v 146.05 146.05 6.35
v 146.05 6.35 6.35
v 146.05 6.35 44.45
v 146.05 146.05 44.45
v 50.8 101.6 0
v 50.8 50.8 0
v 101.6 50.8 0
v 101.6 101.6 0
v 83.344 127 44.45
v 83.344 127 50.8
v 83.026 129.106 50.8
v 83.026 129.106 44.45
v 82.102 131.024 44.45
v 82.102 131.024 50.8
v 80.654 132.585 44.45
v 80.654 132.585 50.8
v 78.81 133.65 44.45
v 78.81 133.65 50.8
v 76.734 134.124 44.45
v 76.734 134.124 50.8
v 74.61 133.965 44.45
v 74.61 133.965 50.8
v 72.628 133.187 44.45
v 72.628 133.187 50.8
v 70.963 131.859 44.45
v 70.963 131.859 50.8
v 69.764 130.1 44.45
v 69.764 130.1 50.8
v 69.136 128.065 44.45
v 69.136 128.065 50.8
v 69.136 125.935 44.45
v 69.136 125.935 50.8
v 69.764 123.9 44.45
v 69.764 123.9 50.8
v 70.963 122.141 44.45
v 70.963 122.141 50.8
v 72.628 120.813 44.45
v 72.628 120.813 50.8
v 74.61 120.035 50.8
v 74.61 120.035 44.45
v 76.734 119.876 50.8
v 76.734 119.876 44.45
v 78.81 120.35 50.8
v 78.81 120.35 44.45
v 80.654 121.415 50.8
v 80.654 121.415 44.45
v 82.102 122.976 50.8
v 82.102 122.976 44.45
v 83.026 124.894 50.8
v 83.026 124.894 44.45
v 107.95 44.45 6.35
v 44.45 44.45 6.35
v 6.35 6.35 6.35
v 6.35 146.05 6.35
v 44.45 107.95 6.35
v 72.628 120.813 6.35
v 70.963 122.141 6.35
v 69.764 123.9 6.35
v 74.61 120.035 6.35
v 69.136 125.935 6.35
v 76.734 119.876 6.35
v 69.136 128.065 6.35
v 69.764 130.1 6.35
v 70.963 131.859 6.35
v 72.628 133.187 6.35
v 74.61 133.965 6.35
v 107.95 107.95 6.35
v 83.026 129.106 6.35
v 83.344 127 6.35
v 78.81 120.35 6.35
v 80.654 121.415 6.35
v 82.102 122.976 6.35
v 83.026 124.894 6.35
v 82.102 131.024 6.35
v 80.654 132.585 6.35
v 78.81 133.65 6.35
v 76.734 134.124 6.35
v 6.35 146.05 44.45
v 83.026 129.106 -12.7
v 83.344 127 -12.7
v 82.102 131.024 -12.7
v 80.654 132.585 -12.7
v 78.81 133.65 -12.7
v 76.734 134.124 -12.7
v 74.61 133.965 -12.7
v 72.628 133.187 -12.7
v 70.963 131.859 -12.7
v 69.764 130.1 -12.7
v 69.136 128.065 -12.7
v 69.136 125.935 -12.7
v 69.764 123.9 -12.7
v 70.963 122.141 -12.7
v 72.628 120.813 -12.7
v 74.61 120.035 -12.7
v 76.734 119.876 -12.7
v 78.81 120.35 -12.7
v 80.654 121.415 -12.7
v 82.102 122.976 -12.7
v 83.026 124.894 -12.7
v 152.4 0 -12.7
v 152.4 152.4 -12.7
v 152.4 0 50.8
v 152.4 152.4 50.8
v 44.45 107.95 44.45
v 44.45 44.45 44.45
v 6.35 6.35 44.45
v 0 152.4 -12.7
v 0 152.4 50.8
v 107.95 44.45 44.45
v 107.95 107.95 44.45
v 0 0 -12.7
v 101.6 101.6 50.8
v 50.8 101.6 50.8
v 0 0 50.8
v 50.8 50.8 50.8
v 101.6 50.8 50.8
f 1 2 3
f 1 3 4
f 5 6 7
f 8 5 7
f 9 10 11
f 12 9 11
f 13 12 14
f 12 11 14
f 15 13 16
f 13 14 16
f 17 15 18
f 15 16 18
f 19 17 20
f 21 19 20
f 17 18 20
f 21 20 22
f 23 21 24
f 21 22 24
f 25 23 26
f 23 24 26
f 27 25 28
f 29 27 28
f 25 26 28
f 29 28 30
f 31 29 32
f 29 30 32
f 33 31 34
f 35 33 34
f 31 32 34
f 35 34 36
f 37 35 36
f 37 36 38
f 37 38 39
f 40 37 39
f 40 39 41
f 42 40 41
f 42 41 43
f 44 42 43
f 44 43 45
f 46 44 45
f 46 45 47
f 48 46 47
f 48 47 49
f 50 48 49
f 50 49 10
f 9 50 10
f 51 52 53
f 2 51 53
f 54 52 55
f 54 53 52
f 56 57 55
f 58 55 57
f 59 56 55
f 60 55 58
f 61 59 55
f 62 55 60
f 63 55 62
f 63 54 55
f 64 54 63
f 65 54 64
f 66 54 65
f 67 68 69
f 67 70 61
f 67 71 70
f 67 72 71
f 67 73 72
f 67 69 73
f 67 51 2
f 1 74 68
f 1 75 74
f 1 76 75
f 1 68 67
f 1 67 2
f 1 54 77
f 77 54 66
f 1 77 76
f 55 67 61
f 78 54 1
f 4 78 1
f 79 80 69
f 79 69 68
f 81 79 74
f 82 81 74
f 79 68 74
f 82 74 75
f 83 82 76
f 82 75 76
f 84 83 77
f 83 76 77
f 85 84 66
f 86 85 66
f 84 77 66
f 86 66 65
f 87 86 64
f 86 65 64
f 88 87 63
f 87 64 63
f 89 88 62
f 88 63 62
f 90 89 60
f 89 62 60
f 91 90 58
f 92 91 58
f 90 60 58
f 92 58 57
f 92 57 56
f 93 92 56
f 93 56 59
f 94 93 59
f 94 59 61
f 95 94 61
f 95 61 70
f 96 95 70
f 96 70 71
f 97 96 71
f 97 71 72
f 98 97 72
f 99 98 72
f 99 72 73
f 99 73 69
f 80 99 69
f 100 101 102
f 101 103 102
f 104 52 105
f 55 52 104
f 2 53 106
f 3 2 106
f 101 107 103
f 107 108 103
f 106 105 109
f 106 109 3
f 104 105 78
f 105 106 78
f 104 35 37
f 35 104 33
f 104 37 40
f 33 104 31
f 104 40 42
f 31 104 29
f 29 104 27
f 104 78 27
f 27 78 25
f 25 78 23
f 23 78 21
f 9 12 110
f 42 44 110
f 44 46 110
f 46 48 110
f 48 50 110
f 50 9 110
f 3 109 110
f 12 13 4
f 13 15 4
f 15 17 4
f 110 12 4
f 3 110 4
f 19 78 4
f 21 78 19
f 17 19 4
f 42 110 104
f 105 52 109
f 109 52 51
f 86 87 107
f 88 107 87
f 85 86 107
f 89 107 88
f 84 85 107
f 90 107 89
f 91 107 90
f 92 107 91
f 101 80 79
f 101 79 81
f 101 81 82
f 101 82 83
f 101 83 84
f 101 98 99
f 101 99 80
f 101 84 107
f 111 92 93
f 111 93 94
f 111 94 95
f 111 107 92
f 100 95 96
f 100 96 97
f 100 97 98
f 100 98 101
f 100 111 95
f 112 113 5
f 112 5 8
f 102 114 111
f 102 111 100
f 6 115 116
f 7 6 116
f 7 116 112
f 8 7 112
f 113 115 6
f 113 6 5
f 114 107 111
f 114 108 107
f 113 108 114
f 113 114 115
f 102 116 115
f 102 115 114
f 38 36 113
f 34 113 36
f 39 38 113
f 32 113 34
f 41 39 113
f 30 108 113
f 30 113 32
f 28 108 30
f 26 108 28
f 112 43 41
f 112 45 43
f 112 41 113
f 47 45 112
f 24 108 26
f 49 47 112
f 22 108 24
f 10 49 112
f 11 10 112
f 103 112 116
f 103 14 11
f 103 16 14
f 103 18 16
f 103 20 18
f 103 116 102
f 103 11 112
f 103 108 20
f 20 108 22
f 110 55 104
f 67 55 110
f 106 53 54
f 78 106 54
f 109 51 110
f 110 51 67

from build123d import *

# Parameters (mm, degrees)
F0_W     = 152.4
F0_H     = 152.4
F0_W_2   = 50.8
F0_H_2   = 50.8
F1_DEPTH = 50.8
F2_T     = -6.35
F3_W     = 6.35
F3_H     = 38.1
F4_DEPTH = 139.7
F5_W     = 152.4
F5_H     = 152.4
F6_DEPTH = 12.7
F7_R     = 7.14375
F8_DEPTH = 76.2


with BuildPart() as f1:
    # F0 (on Top) → F1 (new body)
    with BuildSketch(Plane.XY):
        with Locations((76.2, 76.2)):
            Rectangle(F0_W, F0_H)
        with Locations((76.2, 76.2)):
            Rectangle(F0_W_2, F0_H_2, mode=Mode.SUBTRACT)
    extrude(amount=F1_DEPTH)

    # F2
    f2_openings = [f1.faces().sort_by_distance(p)[0] for p in [
        (76.2, 0, 25.4),
    ]]
    offset(amount=F2_T, openings=f2_openings, kind=Kind.INTERSECTION)

    # F3 (on face) → F4 (join)
    with BuildSketch(Plane.YZ.offset(6.35)):
        with Locations((3.175, 25.4)):
            Rectangle(F3_W, F3_H)
    extrude(amount=F4_DEPTH)

    # F5 (on face) → F6 (join)
    with BuildSketch(Plane(origin=(0, 0, 0), x_dir=(1, 0, 0), z_dir=(0, 0, -1))):
        with Locations((76.2, -76.2)):
            Rectangle(F5_W, F5_H)
    extrude(amount=F6_DEPTH)

    # F7 (on face) → F8 (cut)
    with BuildSketch(Plane.XY.offset(50.8)):
        with Locations((76.2, 127)):
            Circle(F7_R)
    extrude(amount=-F8_DEPTH, mode=Mode.SUBTRACT)


solid = f1.part
